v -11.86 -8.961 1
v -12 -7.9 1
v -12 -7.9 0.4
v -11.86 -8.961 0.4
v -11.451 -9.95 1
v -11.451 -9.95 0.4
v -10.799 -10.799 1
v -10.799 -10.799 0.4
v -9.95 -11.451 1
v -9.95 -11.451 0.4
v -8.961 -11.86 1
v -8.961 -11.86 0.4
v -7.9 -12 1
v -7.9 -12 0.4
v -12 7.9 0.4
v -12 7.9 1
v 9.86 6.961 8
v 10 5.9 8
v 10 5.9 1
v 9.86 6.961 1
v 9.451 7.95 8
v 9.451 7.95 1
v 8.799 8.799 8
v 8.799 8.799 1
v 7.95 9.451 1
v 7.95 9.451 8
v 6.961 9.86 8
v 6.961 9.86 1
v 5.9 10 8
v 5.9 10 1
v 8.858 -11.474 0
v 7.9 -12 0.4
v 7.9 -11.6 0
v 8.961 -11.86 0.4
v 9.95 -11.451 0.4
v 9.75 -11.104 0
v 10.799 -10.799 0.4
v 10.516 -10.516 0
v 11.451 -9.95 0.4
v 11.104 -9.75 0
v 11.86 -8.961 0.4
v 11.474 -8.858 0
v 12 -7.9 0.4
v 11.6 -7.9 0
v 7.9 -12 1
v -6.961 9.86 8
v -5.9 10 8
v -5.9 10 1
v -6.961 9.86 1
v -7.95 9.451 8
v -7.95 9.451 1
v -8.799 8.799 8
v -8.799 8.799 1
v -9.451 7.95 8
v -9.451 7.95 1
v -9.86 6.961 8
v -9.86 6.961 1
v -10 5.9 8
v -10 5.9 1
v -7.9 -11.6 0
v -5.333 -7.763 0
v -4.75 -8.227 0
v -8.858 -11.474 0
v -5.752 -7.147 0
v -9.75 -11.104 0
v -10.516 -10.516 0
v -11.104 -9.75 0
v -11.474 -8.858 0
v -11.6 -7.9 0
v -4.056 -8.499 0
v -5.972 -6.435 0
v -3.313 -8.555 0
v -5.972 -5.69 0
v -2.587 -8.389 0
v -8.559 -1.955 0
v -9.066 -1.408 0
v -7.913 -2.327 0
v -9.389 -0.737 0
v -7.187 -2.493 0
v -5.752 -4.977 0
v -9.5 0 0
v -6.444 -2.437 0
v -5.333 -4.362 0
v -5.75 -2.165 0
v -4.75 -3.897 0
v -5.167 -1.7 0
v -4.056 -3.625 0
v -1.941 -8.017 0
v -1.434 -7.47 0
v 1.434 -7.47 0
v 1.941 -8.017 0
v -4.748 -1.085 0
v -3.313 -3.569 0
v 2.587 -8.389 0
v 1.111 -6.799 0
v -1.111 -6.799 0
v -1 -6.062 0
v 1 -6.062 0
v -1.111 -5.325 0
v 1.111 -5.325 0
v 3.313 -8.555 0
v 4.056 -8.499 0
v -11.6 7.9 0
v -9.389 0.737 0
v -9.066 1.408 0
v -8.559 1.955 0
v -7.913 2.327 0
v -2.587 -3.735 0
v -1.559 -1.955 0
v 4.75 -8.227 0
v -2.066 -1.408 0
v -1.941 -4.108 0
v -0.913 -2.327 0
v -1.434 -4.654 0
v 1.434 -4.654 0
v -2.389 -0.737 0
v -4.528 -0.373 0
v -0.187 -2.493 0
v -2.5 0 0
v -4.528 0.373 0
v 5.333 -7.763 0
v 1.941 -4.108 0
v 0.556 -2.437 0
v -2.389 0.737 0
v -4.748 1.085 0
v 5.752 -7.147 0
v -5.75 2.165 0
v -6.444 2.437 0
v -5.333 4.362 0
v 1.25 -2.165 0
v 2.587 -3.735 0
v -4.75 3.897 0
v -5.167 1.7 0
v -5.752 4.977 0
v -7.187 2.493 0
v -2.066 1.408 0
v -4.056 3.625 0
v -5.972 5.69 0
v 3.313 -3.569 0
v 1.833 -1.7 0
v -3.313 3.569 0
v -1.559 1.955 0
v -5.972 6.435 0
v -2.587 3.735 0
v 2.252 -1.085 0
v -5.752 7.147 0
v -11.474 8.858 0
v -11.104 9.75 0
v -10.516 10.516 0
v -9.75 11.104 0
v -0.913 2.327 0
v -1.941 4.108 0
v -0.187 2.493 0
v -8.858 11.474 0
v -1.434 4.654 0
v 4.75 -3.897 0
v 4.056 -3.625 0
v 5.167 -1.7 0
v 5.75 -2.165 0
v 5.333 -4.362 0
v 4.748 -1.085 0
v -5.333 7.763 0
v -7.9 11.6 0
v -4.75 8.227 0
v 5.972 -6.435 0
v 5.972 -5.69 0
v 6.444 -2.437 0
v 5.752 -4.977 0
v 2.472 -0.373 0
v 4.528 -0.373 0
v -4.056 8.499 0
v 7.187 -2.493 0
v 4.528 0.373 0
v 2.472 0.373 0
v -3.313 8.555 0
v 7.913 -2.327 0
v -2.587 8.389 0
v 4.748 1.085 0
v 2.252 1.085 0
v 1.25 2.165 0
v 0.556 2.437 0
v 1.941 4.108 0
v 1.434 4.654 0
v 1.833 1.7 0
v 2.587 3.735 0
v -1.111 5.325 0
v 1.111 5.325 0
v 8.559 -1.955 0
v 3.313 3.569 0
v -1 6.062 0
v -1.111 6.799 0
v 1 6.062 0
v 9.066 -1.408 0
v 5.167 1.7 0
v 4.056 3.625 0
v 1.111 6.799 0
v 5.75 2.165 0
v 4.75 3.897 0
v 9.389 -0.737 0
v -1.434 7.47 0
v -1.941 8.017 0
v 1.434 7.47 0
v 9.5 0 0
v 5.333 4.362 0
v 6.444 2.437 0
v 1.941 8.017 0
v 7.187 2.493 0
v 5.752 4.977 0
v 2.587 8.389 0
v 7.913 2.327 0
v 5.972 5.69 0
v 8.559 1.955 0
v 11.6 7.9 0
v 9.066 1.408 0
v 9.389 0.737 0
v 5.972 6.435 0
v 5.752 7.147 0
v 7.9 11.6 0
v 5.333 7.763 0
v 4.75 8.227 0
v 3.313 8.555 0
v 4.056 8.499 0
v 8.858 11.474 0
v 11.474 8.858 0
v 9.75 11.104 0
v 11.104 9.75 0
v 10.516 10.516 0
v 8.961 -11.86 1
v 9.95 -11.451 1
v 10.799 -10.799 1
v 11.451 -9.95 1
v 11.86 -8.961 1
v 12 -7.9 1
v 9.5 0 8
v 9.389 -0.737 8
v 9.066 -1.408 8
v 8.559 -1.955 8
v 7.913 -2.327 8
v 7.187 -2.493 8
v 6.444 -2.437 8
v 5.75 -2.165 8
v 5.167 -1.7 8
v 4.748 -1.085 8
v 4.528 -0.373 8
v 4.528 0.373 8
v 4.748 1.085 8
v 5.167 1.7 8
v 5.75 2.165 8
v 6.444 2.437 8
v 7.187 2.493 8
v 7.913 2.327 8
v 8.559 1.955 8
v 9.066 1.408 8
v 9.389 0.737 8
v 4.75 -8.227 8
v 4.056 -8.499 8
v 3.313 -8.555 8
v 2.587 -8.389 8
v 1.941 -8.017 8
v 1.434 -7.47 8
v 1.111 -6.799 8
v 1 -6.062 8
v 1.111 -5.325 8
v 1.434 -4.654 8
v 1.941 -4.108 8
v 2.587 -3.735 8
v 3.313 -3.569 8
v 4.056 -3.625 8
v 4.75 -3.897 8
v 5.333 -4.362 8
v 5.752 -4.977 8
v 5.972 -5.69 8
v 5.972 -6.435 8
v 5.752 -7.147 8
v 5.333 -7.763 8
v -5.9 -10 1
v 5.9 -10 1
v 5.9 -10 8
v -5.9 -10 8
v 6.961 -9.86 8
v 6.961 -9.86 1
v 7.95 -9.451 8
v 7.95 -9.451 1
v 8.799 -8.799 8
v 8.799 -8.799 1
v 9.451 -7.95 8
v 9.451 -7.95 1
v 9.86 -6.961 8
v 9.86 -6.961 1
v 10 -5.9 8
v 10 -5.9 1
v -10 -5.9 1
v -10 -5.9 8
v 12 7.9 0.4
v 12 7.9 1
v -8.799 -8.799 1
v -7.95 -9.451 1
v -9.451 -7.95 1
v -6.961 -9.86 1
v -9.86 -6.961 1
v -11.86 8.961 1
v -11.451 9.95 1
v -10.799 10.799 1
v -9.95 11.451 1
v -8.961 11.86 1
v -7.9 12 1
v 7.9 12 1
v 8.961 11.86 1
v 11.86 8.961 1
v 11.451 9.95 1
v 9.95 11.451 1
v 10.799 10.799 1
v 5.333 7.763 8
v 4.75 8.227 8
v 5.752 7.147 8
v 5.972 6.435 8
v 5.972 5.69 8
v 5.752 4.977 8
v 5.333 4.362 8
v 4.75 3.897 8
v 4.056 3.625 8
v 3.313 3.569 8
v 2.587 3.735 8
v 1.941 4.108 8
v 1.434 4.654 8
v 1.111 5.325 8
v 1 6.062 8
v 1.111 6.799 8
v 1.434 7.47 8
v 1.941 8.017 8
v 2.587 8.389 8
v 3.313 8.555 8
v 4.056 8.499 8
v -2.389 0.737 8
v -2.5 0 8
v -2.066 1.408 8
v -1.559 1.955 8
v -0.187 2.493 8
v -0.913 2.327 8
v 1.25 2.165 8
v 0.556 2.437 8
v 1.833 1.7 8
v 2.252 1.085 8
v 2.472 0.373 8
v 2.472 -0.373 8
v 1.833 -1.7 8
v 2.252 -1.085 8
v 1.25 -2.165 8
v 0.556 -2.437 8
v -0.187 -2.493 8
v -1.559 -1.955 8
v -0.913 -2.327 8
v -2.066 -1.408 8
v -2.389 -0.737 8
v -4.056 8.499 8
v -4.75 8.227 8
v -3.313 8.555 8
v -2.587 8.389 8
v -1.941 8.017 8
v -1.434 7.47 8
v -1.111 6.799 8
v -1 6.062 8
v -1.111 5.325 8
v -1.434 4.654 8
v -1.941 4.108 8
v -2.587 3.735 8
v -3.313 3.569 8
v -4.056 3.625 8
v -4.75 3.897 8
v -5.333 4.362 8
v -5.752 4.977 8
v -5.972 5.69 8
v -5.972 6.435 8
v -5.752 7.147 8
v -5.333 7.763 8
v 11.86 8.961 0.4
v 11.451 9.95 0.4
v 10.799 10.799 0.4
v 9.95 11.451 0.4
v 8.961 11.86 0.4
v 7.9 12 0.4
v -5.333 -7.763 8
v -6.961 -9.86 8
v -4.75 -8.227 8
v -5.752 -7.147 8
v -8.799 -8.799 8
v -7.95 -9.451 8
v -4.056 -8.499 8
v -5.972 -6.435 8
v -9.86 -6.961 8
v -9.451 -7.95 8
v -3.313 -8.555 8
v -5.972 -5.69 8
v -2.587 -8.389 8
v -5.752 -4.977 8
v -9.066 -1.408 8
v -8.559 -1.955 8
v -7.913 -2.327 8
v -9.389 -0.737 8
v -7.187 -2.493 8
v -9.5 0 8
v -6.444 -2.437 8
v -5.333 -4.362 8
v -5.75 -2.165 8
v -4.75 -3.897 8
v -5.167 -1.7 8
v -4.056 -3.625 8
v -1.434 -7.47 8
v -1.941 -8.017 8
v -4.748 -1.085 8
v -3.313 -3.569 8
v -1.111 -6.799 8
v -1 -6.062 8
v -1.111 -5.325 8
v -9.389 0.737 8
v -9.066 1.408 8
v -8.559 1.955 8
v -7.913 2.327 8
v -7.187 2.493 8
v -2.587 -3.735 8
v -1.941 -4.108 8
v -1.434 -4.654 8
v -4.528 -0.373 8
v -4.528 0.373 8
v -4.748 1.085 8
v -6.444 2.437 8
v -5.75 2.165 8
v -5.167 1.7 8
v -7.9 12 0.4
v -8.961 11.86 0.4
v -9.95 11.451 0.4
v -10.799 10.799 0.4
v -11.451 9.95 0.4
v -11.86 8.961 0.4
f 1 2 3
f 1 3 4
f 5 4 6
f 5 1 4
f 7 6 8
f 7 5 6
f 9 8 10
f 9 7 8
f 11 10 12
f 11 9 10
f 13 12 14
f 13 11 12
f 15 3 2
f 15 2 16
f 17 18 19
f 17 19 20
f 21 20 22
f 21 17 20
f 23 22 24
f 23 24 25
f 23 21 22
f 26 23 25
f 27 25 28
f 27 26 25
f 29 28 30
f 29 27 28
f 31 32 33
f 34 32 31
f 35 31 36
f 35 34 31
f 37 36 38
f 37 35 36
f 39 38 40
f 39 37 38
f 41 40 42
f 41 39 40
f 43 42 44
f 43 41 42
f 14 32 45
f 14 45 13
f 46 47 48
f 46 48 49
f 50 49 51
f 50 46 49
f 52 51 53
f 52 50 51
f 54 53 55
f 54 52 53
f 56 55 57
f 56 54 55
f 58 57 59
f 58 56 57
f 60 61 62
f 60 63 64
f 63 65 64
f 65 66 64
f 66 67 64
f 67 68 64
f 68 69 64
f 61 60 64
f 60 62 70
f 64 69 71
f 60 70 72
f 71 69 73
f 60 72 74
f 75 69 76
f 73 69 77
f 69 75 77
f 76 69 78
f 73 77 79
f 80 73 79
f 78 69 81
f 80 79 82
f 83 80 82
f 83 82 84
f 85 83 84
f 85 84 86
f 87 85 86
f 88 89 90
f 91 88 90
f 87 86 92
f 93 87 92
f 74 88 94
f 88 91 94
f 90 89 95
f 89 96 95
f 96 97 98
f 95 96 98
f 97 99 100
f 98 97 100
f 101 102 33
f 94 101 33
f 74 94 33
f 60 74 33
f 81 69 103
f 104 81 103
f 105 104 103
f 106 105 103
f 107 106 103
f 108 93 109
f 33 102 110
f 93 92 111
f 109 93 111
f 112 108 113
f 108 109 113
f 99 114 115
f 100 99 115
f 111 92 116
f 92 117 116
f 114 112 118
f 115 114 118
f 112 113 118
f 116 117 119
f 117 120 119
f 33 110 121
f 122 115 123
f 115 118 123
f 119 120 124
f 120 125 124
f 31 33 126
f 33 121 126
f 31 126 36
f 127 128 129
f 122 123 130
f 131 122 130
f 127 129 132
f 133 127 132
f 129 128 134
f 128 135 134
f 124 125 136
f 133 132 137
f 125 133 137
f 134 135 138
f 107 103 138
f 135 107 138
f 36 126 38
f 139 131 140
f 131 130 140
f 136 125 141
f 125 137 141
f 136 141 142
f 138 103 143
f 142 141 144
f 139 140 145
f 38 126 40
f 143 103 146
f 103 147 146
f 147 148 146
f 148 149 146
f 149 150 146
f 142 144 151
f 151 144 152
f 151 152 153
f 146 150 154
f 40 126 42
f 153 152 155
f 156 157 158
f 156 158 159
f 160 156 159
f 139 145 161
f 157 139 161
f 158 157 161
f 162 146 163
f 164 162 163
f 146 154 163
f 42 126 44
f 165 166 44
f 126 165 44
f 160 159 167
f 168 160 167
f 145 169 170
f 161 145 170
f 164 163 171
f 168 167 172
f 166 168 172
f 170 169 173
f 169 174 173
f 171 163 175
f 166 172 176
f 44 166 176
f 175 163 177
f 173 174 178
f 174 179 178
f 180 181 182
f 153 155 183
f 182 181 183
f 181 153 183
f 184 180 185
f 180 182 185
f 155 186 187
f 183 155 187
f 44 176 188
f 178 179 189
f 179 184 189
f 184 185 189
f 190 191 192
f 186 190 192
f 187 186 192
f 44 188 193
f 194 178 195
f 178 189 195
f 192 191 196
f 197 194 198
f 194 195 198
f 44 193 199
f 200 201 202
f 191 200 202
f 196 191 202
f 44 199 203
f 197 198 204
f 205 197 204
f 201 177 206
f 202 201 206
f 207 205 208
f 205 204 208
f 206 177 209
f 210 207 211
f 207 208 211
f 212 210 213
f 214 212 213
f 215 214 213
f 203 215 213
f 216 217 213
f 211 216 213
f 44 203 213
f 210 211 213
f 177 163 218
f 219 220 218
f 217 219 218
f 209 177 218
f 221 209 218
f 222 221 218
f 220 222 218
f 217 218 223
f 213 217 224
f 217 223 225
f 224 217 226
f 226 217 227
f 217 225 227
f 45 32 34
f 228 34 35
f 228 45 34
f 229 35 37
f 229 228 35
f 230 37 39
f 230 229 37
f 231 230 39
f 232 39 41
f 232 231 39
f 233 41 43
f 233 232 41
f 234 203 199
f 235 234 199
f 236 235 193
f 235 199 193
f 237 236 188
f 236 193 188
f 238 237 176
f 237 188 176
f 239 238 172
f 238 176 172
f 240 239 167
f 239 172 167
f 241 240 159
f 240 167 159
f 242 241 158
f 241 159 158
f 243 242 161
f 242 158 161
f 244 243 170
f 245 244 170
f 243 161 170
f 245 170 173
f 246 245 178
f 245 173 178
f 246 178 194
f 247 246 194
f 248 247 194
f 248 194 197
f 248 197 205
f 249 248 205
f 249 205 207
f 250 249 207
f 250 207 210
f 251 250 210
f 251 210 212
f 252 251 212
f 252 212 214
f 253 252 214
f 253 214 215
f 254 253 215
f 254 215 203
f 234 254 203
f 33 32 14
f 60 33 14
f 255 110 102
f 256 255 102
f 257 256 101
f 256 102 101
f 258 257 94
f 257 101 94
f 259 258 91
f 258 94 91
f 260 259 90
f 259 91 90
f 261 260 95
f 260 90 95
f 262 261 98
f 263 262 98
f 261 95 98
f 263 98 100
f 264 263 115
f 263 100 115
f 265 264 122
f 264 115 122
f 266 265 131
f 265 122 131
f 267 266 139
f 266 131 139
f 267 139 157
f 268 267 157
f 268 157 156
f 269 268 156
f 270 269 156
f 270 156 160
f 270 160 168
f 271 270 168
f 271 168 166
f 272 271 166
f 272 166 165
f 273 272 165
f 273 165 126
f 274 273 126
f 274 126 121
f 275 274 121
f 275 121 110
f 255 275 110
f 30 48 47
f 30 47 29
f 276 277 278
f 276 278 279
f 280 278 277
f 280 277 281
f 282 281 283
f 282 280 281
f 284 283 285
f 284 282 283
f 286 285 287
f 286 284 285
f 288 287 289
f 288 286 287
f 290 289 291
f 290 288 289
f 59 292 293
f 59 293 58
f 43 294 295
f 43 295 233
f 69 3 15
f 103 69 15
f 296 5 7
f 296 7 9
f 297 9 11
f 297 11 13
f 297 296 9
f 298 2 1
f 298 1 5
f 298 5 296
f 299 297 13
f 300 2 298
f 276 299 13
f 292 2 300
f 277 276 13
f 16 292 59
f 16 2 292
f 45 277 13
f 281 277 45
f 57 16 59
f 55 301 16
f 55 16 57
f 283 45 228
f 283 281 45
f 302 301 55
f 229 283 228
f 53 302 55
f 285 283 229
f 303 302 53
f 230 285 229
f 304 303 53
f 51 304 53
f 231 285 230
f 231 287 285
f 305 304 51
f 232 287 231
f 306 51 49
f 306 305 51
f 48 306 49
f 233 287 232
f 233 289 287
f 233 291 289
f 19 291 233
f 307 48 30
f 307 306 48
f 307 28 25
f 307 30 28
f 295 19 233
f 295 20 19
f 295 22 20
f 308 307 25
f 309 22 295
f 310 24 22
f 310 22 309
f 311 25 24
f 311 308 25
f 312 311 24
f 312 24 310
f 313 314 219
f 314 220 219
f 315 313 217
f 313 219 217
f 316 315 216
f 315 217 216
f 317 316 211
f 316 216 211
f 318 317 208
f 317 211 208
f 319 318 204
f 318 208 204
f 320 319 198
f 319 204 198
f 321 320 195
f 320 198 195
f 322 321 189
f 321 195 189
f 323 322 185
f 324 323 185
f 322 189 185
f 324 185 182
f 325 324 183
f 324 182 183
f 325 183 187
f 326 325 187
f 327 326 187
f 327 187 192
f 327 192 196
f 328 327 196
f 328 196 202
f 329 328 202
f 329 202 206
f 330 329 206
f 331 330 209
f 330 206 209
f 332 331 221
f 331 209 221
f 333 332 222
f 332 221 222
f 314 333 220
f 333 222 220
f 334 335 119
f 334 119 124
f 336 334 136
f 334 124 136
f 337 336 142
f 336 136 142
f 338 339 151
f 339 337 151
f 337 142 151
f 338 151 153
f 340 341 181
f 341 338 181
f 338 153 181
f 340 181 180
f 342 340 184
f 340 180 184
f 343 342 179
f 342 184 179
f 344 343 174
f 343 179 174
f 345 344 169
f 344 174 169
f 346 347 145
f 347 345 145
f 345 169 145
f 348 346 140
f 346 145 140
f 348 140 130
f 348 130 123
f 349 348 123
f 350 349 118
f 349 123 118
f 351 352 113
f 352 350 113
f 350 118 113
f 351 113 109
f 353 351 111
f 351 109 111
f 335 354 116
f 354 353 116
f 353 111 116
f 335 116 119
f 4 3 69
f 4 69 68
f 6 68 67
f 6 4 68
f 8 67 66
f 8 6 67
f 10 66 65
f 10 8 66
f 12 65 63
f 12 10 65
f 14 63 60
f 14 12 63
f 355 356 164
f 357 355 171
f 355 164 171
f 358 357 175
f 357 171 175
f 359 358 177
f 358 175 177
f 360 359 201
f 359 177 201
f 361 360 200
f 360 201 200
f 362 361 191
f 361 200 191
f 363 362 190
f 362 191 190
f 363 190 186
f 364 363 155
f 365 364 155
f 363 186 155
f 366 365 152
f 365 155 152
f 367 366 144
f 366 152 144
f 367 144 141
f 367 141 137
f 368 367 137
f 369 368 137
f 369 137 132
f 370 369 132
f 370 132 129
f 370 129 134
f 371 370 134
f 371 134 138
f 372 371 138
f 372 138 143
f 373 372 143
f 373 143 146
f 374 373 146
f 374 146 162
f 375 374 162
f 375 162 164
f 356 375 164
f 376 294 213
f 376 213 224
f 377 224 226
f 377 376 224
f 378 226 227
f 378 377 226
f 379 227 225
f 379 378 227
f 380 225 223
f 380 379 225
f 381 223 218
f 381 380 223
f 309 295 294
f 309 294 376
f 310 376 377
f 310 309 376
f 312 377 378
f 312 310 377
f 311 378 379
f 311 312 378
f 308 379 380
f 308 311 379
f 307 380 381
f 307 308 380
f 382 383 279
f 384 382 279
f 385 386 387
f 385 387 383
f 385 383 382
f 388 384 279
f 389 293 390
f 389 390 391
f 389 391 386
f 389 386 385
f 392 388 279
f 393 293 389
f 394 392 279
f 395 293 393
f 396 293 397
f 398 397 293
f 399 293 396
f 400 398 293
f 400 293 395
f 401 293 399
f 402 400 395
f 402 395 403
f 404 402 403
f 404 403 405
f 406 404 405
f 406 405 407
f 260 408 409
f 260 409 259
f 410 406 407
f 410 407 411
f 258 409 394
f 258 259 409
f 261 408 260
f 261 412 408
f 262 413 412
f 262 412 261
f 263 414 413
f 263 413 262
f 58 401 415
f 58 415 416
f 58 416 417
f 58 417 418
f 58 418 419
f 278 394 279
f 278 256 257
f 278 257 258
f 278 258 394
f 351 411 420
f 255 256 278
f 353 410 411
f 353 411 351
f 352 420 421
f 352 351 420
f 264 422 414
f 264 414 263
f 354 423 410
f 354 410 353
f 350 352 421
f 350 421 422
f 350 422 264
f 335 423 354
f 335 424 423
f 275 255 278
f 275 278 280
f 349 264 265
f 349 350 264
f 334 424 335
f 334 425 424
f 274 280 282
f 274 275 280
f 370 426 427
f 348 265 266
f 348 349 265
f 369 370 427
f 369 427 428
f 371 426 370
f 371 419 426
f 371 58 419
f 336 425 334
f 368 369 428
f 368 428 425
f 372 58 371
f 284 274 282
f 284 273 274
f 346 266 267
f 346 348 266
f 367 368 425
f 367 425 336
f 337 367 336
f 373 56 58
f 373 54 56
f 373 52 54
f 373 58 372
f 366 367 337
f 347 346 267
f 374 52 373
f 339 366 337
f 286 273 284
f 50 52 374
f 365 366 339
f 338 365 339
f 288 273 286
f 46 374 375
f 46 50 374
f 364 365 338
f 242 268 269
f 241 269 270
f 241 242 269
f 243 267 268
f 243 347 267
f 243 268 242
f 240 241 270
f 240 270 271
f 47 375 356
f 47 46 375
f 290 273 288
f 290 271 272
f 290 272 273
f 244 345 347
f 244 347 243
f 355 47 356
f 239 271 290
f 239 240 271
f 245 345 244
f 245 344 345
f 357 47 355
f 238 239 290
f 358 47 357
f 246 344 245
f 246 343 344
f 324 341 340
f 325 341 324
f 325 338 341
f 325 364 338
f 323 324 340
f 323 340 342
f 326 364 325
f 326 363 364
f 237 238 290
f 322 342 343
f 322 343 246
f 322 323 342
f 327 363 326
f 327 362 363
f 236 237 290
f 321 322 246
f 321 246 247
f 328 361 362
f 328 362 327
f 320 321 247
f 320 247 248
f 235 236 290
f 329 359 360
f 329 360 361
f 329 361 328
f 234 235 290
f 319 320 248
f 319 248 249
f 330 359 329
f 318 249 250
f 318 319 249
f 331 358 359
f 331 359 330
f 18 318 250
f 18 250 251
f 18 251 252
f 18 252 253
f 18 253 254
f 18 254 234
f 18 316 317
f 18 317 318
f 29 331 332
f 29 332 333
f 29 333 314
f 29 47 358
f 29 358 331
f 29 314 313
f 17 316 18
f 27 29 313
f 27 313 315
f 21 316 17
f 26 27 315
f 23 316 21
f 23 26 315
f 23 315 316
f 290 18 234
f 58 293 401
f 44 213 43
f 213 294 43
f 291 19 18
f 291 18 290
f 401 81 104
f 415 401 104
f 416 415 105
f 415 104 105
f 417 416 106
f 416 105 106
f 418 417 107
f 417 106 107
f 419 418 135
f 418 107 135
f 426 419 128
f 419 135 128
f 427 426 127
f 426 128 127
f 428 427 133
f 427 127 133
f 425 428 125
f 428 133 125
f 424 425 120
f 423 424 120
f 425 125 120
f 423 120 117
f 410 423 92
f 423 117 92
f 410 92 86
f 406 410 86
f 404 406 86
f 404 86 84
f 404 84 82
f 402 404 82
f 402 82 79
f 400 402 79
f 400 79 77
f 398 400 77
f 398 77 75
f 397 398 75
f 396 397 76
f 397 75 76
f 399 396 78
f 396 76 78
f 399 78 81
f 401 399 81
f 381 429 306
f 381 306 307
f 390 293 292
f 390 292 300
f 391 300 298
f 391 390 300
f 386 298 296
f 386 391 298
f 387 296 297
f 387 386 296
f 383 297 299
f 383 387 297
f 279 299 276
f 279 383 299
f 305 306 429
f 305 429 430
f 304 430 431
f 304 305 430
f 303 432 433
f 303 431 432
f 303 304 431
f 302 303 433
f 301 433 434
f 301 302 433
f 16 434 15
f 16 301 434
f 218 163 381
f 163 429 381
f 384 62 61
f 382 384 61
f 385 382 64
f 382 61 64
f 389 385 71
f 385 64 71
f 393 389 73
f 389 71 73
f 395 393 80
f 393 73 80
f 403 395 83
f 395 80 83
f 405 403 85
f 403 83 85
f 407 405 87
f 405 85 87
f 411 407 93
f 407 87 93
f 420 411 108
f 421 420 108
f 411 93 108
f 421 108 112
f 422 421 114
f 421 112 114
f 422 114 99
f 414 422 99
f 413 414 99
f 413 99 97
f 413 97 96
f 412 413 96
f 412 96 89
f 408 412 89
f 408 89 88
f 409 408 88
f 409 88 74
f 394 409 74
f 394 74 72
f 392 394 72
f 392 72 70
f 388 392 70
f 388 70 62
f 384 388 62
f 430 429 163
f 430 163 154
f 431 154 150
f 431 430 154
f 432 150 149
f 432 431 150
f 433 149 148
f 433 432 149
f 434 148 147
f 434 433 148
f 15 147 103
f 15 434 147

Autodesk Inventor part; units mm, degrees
ref_plane "YZ Plane" through (0, 0, 0) normal (1, 0, 0) x (0, 1, 0)
ref_plane "XZ Plane" through (0, 0, 0) normal (0, 1, 0) x (-1, 0, 0)
ref_plane "XY Plane" through (0, 0, 0) normal (0, 0, 1) x (1, 0, 0)
sketch "Sketch1" plane through (0, 0, 0) normal (0, 0, 1) x (1, 0, 0)
  line L0 (-12, 12) -> (12, 12)
  line L1 (12, 12) -> (12, -12)
  line L2 (12, -12) -> (-12, -12)
  line L3 (-12, -12) -> (-12, 12)
  line L4 (-12, 12) -> (12, -12) construction
  line L5 (12, 12) -> (-12, -12) construction
  point P0 (0, 0)
  dimension "d0" = 24
  dimension "d1" = 24
extrude "Extrusion1" add sketch "Sketch1" along normal blind 1
sketch "Sketch2" plane through (0, 0, 1) normal (0, 0, 1) x (1, 0, 0)
  line L0 (-10, 10) -> (10, 10)
  line L1 (10, 10) -> (10, -10)
  line L2 (10, -10) -> (-10, -10)
  line L3 (-10, -10) -> (-10, 10)
  line L4 (-10, 10) -> (10, -10) construction
  line L5 (10, 10) -> (-10, -10) construction
  point P0 (0, 0)
  dimension "d4" = 20
  dimension "d5" = 20
extrude "Extrusion2" add sketch "Sketch2" along normal blind 7
fillet "Fillet1" radius 4.1 8 edges at (10, 10, 4.5) (-10, 10, 4.5) (-10, -10, 4.5) (10, -10, 4.5) (12, -12, 0.5) (12, 12, 0.5) (-12, 12, 0.5) (-12, -12, 0.5)
chamfer "Chamfer1" distance 0.4 angle 45 8 edges at (-12, 0, 0) (-10.7991, -10.7991, 0) (0, -12, 0) (10.7991, -10.7991, 0) (12, 0, 0) (10.7991, 10.7991, 0) (0, 12, 0) (-10.7991, 10.7991, 0)
sketch "Sketch3" plane through (0, 0, 0) normal (0, 0, -1) x (-1, 0, 0)
  circle A0 centre (0, 0) radius 2.5
  circle A1 centre (7, 0) radius 2.5
  dimension "d12" = 5
  dimension "d15" = 7
extrude "Extrusion3" cut sketch "Sketch3" against normal through all
pattern_circular "Circular Pattern1" count 6 over 360 about axis through (0, 0, 0) along (0, 0, 1) of "Extrusion3"
equation "\"d1\" = d0"
properties part number "Speaker Cover"
